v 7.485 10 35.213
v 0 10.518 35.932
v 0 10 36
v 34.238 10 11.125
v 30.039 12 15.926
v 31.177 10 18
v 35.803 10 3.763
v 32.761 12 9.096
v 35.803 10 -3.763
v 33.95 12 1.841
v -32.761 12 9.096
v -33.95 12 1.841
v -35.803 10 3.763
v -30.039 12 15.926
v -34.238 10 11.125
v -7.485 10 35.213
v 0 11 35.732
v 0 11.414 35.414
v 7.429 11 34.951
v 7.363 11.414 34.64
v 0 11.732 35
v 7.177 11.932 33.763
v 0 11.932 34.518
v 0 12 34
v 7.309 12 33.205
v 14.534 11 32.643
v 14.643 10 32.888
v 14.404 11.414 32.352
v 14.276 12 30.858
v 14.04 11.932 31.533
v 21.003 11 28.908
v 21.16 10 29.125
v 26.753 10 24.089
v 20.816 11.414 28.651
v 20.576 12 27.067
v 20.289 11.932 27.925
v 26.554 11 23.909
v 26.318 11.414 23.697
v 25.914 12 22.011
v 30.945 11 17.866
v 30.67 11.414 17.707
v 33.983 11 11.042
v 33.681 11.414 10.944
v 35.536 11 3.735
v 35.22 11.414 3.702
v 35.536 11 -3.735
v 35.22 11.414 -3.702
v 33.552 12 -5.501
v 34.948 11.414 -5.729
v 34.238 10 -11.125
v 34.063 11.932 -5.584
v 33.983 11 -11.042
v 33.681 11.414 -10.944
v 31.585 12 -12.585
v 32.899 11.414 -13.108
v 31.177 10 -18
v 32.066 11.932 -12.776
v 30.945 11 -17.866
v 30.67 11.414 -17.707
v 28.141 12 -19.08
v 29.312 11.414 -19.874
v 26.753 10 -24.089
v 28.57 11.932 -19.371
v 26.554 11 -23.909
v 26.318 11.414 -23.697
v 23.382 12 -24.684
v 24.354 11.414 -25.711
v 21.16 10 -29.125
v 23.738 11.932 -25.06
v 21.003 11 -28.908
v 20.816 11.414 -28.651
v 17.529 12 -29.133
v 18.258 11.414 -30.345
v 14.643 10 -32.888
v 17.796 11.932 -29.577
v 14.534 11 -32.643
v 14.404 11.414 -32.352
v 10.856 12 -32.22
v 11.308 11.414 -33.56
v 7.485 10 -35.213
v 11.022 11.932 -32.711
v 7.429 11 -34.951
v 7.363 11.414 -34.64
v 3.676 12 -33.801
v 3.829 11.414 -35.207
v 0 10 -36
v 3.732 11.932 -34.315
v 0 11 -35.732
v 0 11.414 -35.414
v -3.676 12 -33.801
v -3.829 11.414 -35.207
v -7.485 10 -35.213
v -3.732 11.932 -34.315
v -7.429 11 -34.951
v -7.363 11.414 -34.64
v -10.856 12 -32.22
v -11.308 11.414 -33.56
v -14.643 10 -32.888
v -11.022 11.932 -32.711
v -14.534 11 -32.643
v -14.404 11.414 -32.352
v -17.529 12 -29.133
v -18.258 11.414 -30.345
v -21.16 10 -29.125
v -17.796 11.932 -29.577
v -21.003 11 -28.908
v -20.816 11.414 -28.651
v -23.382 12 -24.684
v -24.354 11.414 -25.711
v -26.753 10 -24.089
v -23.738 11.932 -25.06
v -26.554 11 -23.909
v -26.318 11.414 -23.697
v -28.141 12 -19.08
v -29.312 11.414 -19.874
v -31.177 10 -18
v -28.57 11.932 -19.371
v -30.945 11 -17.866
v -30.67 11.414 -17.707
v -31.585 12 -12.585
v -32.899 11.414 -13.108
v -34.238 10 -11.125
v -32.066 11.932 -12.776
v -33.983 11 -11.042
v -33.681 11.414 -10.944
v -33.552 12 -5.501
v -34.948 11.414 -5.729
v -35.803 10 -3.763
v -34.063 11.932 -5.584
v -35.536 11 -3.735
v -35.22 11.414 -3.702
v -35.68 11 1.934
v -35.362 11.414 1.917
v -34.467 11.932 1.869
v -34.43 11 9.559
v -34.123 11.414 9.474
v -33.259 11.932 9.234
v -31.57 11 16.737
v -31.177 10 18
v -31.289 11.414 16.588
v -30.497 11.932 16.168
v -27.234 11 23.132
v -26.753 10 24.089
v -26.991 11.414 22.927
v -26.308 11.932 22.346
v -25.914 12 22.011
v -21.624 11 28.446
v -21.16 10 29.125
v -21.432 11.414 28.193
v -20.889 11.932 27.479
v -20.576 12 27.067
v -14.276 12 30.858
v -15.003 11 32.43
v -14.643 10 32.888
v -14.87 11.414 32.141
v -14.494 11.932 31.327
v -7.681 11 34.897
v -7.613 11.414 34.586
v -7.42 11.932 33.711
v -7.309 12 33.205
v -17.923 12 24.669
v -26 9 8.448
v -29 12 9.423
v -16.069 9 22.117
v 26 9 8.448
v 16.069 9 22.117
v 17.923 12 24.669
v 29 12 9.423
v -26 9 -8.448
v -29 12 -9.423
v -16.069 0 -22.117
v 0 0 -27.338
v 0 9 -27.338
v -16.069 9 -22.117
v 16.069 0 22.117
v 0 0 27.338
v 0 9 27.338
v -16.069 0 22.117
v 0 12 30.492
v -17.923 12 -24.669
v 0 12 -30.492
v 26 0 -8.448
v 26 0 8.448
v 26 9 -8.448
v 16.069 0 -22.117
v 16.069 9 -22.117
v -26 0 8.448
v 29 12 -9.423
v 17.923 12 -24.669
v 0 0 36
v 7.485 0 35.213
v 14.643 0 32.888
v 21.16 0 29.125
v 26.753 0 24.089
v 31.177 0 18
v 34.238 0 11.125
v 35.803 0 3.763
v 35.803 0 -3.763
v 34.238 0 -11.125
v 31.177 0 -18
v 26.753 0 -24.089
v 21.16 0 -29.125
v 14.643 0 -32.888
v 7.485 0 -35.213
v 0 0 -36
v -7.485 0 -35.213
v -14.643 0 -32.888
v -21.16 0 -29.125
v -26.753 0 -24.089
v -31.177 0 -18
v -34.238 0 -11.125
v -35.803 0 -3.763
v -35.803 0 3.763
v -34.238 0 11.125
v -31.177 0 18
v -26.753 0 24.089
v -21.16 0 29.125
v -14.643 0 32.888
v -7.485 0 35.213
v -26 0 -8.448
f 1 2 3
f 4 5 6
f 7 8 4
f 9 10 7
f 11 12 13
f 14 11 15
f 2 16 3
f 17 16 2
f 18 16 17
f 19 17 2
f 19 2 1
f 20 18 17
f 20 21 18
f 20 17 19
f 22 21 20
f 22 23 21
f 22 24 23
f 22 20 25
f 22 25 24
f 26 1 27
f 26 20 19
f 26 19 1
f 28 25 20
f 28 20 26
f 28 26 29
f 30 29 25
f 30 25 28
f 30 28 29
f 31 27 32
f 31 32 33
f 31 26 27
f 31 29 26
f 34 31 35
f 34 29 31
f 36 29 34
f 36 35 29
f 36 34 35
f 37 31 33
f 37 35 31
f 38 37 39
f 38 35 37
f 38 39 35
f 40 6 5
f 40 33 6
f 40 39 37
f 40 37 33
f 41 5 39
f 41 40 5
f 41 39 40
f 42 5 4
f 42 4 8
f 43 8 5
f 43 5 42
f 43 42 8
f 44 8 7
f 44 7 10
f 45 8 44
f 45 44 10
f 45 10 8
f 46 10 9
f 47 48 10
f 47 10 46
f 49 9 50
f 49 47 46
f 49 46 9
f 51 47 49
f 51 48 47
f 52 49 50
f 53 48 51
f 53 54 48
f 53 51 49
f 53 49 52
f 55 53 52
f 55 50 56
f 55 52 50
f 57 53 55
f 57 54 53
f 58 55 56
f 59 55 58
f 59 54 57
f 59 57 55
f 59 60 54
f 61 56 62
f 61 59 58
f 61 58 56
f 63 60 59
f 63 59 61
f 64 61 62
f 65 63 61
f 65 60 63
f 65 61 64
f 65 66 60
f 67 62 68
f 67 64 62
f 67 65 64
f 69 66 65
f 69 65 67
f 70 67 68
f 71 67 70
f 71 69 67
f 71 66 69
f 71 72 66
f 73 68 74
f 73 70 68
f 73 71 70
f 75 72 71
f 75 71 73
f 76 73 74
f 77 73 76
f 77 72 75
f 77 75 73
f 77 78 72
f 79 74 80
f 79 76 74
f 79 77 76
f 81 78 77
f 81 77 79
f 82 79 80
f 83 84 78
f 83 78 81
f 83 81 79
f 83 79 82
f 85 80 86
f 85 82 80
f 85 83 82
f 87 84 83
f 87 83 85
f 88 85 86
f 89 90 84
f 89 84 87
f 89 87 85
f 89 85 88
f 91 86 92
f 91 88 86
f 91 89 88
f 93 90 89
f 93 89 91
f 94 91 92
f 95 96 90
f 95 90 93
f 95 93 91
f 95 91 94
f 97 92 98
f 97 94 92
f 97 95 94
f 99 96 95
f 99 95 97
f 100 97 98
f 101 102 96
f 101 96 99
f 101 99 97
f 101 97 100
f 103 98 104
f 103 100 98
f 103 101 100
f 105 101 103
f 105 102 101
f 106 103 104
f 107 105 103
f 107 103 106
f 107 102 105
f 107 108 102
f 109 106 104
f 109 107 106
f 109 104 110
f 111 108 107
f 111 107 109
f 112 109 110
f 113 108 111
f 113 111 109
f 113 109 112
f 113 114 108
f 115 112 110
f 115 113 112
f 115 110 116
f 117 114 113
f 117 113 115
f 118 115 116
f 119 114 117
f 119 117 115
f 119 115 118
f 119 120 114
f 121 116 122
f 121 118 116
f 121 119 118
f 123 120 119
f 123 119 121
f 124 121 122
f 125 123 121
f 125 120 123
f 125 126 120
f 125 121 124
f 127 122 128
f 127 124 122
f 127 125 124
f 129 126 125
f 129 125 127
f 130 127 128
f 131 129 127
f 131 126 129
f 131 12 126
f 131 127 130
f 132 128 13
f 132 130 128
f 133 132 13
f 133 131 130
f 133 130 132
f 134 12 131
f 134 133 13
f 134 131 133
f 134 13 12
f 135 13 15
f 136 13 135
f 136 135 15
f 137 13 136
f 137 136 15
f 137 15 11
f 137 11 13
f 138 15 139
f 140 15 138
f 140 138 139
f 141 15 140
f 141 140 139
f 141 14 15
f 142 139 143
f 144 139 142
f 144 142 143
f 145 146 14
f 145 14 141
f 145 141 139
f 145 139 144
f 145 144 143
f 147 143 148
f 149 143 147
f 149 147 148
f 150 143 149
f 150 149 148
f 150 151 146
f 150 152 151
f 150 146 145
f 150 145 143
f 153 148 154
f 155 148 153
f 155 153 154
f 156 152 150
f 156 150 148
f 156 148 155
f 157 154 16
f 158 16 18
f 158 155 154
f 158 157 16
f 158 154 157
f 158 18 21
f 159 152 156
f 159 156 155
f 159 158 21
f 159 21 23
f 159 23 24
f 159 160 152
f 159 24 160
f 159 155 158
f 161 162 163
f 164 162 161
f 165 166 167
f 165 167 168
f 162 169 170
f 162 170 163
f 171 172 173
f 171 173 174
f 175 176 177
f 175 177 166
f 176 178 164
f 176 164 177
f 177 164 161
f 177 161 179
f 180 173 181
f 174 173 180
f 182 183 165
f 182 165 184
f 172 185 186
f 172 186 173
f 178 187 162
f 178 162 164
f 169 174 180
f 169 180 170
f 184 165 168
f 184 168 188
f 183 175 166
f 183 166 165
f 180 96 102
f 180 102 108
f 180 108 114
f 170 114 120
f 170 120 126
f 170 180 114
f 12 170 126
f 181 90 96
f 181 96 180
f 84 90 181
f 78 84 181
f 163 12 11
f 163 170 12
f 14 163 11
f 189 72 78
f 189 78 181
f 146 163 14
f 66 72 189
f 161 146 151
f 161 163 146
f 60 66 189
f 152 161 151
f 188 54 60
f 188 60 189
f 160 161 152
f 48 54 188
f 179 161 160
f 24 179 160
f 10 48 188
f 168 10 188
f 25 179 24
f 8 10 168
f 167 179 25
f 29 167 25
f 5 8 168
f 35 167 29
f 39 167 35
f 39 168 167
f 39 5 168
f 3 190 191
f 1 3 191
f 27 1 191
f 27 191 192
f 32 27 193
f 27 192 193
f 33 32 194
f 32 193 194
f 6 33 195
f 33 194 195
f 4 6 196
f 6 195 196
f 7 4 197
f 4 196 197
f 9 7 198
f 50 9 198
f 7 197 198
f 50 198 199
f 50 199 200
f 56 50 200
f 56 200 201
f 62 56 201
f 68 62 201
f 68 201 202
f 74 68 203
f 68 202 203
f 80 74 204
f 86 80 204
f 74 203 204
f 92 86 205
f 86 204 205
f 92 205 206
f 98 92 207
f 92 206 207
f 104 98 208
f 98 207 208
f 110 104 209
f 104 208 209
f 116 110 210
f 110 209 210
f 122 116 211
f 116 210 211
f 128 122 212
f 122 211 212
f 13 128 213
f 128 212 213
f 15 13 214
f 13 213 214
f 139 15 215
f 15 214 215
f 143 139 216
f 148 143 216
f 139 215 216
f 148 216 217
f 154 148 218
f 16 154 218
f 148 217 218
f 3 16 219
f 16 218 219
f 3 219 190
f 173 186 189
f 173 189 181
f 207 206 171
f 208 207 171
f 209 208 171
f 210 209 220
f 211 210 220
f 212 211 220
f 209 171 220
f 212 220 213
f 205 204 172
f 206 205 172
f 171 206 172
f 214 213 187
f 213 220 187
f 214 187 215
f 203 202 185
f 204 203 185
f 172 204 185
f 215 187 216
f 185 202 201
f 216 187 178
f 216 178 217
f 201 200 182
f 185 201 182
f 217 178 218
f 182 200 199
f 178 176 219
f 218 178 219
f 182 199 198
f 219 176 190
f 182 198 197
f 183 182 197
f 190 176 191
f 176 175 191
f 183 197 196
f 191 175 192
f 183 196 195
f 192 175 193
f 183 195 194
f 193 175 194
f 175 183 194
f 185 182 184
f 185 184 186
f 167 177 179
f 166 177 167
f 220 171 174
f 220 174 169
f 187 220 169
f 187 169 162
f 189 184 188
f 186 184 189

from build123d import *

# Parameters (mm, degrees)
SKETCH1_R           = 36
BOSS_EXTRUDE1_DEPTH = 12
FILLET1_R           = 2
CHAMFER1_SIZE       = 3


with BuildPart() as part:
    # Sketch1 → Boss-Extrude1 (new body)
    with BuildSketch(Plane(origin=(0, 0, 0), x_dir=(1, 0, 0), z_dir=(0, 1, 0))):
        with Locations(Location((0, 0, 0), (0, 0, 270))):
            Circle(SKETCH1_R)
        Polygon((16.068883707, 22.116921017), (0, 27.33801783), (-16.068883707, 22.116921017), (-26, 8.447912102), (-26, -8.447912102), (-16.068883707, -22.116921017), (0, -27.33801783), (16.068883707, -22.116921017), (26, -8.447912102), (26, 8.447912102), align=None, mode=Mode.SUBTRACT)
    extrude(amount=BOSS_EXTRUDE1_DEPTH)

    # Fillet1
    fillet1_edges = [part.edges().sort_by_distance(p)[0] for p in [
        (0, 12, -36),
    ]]
    fillet(fillet1_edges, radius=FILLET1_R)

    # Chamfer1
    chamfer1_edges = [part.edges().sort_by_distance(p)[0] for p in [
        (21.034441854, 12, -15.28241656),
        (8.034441854, 12, -24.727469424),
        (-8.034441854, 12, -24.727469424),
        (-21.034441854, 12, -15.28241656),
        (-26, 12, 0),
        (-21.034441854, 12, 15.28241656),
        (-8.034441854, 12, 24.727469424),
        (8.034441854, 12, 24.727469424),
        (21.034441854, 12, 15.28241656),
        (26, 12, 0),
    ]]
    chamfer(chamfer1_edges, length=CHAMFER1_SIZE)


solid = part.part
